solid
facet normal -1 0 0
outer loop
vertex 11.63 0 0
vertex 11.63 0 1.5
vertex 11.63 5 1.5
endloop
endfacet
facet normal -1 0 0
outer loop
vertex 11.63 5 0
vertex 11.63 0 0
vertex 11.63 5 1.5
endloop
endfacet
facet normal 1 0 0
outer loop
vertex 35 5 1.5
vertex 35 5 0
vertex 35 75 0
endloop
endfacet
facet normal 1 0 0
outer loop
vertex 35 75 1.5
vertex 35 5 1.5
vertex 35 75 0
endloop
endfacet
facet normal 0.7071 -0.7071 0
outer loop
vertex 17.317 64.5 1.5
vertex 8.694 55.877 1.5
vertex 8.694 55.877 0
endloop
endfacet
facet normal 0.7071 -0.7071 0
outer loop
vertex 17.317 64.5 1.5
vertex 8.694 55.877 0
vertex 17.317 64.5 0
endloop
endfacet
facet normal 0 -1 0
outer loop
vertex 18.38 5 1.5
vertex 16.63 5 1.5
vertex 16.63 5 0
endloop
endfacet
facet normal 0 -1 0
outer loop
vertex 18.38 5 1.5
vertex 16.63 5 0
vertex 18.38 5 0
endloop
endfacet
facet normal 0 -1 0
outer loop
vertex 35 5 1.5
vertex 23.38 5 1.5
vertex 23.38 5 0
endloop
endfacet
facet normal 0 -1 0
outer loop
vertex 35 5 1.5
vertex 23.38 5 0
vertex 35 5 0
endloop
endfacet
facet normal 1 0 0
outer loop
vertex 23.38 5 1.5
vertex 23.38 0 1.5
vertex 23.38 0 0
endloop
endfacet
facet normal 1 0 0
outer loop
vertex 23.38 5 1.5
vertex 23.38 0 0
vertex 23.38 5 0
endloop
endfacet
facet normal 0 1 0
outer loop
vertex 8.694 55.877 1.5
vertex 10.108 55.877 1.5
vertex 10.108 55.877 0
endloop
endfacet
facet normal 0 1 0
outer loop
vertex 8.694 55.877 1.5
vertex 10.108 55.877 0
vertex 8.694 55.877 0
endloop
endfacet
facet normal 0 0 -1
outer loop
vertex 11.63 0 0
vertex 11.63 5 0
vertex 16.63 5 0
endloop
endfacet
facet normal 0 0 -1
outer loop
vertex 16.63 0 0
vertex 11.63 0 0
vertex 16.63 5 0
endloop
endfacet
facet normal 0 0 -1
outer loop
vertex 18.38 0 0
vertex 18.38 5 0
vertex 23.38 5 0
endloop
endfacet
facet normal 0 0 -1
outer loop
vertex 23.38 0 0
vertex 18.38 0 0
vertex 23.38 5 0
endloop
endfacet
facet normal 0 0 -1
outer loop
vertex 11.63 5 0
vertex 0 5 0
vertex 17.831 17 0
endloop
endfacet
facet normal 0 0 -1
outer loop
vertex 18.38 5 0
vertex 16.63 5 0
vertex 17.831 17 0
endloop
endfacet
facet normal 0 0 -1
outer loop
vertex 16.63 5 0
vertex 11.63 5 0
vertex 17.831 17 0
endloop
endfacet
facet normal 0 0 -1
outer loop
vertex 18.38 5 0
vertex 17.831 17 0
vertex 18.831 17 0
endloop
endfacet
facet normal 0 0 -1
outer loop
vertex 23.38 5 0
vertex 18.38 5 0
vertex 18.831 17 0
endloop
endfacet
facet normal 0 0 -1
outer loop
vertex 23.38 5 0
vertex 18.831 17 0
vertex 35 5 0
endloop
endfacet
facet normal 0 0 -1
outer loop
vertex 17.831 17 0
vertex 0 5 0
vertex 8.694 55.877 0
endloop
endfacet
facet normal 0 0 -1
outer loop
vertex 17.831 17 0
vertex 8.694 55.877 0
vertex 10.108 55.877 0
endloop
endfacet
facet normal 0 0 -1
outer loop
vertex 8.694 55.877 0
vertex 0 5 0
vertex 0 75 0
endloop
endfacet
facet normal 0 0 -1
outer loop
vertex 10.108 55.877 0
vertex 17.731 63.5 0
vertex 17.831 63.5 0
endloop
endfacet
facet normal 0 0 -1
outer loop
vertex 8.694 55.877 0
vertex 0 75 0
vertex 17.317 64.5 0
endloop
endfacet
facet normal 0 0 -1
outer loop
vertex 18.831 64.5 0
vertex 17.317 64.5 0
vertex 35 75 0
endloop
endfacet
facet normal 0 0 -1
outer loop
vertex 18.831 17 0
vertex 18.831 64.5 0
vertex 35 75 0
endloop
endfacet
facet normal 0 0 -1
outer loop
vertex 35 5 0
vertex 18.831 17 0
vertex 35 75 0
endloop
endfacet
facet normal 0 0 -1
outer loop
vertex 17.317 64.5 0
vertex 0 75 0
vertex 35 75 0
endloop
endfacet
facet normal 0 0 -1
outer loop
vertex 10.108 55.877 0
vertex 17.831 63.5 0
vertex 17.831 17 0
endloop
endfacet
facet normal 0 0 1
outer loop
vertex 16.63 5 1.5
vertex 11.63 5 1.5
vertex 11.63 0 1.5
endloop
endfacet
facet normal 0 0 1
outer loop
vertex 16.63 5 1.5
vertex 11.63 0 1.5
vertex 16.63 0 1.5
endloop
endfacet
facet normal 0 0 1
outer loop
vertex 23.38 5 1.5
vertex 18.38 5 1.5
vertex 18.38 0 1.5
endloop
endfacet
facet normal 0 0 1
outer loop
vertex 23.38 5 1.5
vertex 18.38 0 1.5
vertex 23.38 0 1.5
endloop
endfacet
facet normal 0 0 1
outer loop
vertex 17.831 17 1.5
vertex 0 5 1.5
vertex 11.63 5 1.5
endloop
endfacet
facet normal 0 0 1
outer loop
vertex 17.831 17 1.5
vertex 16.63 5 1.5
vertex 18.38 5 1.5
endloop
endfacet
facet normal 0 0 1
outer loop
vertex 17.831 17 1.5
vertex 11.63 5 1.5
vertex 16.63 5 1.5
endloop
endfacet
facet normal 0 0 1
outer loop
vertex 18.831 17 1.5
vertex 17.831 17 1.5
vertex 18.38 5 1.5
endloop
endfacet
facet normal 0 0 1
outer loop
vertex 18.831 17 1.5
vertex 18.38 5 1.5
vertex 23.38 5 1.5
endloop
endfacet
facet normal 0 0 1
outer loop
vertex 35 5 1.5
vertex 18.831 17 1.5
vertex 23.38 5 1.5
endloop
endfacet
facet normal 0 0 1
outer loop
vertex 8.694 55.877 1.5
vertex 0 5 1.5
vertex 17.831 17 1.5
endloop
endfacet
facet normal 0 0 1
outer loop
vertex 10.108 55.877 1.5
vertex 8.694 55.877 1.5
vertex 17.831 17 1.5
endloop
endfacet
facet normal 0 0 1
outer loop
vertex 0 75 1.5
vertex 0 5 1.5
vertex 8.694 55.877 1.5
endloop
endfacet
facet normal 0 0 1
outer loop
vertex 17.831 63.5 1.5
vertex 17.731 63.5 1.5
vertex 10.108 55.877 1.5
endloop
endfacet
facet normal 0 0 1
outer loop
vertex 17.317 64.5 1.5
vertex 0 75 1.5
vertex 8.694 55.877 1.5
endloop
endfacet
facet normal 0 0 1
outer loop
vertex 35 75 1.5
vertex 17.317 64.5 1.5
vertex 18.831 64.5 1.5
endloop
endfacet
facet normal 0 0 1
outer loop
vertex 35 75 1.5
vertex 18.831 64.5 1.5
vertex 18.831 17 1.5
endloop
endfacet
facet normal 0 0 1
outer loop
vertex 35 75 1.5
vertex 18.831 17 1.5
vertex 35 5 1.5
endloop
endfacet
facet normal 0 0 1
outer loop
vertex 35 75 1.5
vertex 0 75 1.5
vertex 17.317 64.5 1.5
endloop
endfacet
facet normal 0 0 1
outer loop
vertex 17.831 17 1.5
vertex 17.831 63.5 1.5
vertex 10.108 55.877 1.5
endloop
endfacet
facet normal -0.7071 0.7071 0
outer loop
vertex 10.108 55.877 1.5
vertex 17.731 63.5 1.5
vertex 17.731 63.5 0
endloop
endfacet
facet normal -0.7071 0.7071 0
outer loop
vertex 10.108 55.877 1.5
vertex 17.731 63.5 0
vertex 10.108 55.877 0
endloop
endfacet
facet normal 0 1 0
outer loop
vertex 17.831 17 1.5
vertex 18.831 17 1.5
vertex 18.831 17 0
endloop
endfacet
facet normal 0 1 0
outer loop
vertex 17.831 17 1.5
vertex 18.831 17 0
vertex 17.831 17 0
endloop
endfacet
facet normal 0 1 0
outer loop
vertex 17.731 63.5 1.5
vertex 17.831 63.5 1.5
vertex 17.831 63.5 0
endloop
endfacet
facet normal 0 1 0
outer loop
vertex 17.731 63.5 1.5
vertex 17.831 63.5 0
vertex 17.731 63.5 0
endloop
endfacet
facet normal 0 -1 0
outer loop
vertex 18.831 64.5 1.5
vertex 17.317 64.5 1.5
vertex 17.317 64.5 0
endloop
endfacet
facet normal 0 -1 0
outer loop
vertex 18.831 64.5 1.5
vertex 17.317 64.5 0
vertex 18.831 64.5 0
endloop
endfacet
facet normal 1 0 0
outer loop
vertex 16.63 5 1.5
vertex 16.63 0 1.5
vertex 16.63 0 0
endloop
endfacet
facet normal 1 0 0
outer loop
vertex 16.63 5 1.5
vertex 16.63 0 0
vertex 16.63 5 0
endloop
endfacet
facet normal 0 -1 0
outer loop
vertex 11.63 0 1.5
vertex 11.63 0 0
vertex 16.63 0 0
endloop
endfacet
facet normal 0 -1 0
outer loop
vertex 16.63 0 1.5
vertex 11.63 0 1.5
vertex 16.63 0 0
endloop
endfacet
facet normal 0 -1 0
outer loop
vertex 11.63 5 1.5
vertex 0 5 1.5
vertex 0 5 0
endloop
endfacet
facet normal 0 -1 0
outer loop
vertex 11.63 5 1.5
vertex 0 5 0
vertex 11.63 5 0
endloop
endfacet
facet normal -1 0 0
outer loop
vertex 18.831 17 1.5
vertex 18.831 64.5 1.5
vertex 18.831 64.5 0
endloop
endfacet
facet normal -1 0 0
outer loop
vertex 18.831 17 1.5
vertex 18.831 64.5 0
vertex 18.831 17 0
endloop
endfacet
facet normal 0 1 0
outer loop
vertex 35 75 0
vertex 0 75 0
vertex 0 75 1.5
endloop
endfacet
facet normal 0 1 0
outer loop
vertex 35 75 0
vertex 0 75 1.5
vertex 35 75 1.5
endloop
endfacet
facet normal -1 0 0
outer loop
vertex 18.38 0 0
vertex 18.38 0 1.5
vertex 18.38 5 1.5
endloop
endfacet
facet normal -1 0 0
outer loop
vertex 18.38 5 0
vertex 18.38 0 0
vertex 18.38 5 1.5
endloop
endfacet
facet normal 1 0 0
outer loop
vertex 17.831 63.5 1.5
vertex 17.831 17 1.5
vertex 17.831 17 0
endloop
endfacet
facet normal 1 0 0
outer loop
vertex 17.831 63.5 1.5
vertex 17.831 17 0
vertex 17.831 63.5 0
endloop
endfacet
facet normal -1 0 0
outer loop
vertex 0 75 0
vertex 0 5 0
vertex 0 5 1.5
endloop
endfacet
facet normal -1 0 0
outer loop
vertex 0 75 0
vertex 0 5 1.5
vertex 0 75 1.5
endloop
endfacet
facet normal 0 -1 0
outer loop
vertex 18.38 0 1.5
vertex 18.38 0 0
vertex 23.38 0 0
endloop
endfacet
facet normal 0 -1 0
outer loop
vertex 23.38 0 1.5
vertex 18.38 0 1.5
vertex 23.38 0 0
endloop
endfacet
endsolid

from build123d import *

# Parameters (mm, degrees)
SKIZZE1_W                       = 35
SKIZZE1_H                       = 75
AUFSATZ_LINEAR_AUSTRAGEN1_DEPTH = 1.5
SKIZZE2_W                       = 11.63
SKIZZE2_H                       = 5
SKIZZE2_W_2                     = 11.62
SKIZZE2_W_3                     = 1.75
SCHNITT_LINEAR_AUSTRAGEN1_DEPTH = 1.5
SCHNITT_LINEAR_AUSTRAGEN3_DEPTH = 1.5


with BuildPart() as part:
    # Skizze1 → Aufsatz-Linear austragen1 (new body)
    with BuildSketch(Plane.XY):
        with Locations((17.5, 37.5)):
            Rectangle(SKIZZE1_W, SKIZZE1_H)
    extrude(amount=AUFSATZ_LINEAR_AUSTRAGEN1_DEPTH)

    # Skizze2 → Schnitt-Linear austragen1 (cut)
    with BuildSketch(Plane.XY.offset(1.5)):
        with Locations((5.815, 2.5)):
            Rectangle(SKIZZE2_W, SKIZZE2_H)
        with Locations((29.19, 2.5)):
            Rectangle(SKIZZE2_W_2, SKIZZE2_H)
        with Locations((17.505, 2.5)):
            Rectangle(SKIZZE2_W_3, SKIZZE2_H)
    extrude(amount=-SCHNITT_LINEAR_AUSTRAGEN1_DEPTH, mode=Mode.SUBTRACT)

    # Skizze6 → Schnitt-Linear austragen3 (cut)
    with BuildSketch(Plane.XY.offset(1.5)):
        Polygon((8.694210646, 55.87711337), (17.317097276, 64.5), (18.831310838, 64.5), (18.831310838, 17), (17.831310838, 17), (17.831310838, 63.5), (17.731310838, 63.5), (10.108424208, 55.87711337), align=None)
    extrude(amount=-SCHNITT_LINEAR_AUSTRAGEN3_DEPTH, mode=Mode.SUBTRACT)


solid = part.part
